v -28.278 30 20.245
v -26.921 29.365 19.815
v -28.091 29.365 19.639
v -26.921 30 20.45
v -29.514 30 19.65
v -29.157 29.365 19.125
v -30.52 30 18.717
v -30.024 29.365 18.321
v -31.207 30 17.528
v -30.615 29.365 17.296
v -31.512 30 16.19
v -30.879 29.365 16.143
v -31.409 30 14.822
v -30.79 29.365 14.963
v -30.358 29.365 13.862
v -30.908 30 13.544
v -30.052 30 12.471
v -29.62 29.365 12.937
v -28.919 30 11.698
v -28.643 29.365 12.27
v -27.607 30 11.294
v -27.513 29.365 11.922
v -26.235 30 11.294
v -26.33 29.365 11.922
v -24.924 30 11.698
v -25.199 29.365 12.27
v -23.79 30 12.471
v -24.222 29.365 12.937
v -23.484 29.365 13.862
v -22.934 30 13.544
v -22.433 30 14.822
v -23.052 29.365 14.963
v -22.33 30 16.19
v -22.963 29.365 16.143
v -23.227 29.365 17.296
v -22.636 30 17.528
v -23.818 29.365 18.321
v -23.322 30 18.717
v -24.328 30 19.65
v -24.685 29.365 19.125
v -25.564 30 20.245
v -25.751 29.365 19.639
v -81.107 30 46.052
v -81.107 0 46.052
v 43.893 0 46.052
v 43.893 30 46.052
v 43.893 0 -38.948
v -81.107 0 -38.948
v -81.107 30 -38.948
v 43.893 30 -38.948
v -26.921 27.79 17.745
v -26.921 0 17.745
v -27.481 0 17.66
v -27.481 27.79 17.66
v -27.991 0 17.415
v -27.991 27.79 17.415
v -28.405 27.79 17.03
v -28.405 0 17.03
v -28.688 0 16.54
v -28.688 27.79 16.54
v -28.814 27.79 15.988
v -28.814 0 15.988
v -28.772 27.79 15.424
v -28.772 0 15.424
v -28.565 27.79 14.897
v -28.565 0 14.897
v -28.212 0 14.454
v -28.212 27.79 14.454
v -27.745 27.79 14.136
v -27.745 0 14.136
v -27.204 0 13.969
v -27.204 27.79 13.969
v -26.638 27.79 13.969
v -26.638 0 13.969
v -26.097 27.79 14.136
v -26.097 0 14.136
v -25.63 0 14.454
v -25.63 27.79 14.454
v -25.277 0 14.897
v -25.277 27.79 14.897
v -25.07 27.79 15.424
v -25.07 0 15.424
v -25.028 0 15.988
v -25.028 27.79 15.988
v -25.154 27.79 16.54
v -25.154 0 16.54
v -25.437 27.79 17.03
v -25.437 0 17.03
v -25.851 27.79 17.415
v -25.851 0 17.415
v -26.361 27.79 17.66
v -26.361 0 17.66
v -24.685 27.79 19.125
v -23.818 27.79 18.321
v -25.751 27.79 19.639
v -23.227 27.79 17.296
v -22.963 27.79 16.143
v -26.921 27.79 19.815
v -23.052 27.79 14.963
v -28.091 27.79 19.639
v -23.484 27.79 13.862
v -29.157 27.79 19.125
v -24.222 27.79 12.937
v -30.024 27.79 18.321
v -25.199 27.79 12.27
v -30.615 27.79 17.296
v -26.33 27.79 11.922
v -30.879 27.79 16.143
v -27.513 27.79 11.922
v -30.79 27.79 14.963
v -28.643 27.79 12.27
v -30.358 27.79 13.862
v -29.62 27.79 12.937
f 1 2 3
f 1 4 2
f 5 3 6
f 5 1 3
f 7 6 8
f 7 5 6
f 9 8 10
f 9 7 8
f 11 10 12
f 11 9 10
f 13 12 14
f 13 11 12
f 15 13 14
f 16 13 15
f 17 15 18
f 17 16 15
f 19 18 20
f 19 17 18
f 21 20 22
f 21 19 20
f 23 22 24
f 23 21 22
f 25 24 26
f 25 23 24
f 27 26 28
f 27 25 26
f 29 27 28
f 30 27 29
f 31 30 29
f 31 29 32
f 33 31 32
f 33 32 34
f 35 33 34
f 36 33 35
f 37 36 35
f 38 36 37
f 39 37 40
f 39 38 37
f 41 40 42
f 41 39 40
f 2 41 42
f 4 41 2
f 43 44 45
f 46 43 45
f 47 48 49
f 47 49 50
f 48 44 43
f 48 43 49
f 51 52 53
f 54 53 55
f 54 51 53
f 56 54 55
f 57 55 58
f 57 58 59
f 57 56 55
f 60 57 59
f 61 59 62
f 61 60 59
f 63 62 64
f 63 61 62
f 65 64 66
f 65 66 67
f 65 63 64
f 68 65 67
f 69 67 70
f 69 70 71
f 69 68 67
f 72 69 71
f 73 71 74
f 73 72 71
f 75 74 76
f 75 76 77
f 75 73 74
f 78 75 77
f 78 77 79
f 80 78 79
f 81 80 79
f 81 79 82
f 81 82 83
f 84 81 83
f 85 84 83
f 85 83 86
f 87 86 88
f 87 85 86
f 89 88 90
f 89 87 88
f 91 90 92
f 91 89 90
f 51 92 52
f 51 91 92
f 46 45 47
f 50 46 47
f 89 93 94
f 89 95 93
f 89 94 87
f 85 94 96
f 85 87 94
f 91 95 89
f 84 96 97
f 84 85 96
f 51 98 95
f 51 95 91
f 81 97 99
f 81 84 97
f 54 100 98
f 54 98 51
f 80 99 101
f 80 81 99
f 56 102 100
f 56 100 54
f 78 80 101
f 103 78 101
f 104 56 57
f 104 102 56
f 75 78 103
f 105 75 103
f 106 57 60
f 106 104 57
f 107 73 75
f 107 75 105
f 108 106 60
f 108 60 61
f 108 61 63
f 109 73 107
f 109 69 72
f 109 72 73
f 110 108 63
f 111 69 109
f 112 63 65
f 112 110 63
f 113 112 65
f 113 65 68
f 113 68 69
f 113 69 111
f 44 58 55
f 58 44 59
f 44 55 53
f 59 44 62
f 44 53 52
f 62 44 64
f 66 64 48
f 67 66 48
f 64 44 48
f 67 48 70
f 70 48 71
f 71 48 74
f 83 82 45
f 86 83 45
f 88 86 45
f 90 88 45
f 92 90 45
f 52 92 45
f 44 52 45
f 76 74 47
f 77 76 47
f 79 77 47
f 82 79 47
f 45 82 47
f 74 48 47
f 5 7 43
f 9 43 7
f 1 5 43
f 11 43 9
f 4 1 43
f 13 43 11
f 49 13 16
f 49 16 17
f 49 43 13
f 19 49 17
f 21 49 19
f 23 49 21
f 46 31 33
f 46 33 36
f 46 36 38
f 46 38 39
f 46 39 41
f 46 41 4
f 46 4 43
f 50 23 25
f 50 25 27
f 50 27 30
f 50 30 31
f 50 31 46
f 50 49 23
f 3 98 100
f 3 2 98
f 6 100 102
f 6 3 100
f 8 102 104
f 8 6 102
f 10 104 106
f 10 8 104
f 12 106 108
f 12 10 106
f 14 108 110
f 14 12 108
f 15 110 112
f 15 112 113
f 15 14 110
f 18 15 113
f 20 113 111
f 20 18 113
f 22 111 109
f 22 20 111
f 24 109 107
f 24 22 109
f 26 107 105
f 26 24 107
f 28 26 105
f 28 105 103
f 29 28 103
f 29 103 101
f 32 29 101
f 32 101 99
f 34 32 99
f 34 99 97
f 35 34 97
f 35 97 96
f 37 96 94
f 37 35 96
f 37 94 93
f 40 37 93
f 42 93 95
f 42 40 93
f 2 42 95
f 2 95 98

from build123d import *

# Parameters (mm, degrees)
SKETCH1_W           = 125
SKETCH1_H           = 85
BOSS_EXTRUDE1_DEPTH = 30


with BuildPart() as part:
    # Sketch1 → Boss-Extrude1 (new body)
    with BuildSketch(Plane(origin=(0, 0, 0), x_dir=(1, 0, 0), z_dir=(0, 1, 0))):
        with Locations((-18.606783327, -3.552156635)):
            Rectangle(SKETCH1_W, SKETCH1_H)
    extrude(amount=BOSS_EXTRUDE1_DEPTH)

    # Sketch2 → CBORE for #6 Binding Head Machine Screw1 (revolve, cut)
    with BuildSketch(Plane(origin=(-26.921037191, 30, 15.846157579), x_dir=(0, 0, 1), z_dir=(1, 0, 0))):
        Polygon((0, 0), (0, 30), (1.89865, 30), (1.89865, 2.2098), (3.96875, 2.2098), (3.96875, 0.635), (4.60375, 0), align=None)
    revolve(axis=Axis((-26.921037191, 36.35, 15.846157579), (0, -1, 0)), mode=Mode.SUBTRACT)


solid = part.part
